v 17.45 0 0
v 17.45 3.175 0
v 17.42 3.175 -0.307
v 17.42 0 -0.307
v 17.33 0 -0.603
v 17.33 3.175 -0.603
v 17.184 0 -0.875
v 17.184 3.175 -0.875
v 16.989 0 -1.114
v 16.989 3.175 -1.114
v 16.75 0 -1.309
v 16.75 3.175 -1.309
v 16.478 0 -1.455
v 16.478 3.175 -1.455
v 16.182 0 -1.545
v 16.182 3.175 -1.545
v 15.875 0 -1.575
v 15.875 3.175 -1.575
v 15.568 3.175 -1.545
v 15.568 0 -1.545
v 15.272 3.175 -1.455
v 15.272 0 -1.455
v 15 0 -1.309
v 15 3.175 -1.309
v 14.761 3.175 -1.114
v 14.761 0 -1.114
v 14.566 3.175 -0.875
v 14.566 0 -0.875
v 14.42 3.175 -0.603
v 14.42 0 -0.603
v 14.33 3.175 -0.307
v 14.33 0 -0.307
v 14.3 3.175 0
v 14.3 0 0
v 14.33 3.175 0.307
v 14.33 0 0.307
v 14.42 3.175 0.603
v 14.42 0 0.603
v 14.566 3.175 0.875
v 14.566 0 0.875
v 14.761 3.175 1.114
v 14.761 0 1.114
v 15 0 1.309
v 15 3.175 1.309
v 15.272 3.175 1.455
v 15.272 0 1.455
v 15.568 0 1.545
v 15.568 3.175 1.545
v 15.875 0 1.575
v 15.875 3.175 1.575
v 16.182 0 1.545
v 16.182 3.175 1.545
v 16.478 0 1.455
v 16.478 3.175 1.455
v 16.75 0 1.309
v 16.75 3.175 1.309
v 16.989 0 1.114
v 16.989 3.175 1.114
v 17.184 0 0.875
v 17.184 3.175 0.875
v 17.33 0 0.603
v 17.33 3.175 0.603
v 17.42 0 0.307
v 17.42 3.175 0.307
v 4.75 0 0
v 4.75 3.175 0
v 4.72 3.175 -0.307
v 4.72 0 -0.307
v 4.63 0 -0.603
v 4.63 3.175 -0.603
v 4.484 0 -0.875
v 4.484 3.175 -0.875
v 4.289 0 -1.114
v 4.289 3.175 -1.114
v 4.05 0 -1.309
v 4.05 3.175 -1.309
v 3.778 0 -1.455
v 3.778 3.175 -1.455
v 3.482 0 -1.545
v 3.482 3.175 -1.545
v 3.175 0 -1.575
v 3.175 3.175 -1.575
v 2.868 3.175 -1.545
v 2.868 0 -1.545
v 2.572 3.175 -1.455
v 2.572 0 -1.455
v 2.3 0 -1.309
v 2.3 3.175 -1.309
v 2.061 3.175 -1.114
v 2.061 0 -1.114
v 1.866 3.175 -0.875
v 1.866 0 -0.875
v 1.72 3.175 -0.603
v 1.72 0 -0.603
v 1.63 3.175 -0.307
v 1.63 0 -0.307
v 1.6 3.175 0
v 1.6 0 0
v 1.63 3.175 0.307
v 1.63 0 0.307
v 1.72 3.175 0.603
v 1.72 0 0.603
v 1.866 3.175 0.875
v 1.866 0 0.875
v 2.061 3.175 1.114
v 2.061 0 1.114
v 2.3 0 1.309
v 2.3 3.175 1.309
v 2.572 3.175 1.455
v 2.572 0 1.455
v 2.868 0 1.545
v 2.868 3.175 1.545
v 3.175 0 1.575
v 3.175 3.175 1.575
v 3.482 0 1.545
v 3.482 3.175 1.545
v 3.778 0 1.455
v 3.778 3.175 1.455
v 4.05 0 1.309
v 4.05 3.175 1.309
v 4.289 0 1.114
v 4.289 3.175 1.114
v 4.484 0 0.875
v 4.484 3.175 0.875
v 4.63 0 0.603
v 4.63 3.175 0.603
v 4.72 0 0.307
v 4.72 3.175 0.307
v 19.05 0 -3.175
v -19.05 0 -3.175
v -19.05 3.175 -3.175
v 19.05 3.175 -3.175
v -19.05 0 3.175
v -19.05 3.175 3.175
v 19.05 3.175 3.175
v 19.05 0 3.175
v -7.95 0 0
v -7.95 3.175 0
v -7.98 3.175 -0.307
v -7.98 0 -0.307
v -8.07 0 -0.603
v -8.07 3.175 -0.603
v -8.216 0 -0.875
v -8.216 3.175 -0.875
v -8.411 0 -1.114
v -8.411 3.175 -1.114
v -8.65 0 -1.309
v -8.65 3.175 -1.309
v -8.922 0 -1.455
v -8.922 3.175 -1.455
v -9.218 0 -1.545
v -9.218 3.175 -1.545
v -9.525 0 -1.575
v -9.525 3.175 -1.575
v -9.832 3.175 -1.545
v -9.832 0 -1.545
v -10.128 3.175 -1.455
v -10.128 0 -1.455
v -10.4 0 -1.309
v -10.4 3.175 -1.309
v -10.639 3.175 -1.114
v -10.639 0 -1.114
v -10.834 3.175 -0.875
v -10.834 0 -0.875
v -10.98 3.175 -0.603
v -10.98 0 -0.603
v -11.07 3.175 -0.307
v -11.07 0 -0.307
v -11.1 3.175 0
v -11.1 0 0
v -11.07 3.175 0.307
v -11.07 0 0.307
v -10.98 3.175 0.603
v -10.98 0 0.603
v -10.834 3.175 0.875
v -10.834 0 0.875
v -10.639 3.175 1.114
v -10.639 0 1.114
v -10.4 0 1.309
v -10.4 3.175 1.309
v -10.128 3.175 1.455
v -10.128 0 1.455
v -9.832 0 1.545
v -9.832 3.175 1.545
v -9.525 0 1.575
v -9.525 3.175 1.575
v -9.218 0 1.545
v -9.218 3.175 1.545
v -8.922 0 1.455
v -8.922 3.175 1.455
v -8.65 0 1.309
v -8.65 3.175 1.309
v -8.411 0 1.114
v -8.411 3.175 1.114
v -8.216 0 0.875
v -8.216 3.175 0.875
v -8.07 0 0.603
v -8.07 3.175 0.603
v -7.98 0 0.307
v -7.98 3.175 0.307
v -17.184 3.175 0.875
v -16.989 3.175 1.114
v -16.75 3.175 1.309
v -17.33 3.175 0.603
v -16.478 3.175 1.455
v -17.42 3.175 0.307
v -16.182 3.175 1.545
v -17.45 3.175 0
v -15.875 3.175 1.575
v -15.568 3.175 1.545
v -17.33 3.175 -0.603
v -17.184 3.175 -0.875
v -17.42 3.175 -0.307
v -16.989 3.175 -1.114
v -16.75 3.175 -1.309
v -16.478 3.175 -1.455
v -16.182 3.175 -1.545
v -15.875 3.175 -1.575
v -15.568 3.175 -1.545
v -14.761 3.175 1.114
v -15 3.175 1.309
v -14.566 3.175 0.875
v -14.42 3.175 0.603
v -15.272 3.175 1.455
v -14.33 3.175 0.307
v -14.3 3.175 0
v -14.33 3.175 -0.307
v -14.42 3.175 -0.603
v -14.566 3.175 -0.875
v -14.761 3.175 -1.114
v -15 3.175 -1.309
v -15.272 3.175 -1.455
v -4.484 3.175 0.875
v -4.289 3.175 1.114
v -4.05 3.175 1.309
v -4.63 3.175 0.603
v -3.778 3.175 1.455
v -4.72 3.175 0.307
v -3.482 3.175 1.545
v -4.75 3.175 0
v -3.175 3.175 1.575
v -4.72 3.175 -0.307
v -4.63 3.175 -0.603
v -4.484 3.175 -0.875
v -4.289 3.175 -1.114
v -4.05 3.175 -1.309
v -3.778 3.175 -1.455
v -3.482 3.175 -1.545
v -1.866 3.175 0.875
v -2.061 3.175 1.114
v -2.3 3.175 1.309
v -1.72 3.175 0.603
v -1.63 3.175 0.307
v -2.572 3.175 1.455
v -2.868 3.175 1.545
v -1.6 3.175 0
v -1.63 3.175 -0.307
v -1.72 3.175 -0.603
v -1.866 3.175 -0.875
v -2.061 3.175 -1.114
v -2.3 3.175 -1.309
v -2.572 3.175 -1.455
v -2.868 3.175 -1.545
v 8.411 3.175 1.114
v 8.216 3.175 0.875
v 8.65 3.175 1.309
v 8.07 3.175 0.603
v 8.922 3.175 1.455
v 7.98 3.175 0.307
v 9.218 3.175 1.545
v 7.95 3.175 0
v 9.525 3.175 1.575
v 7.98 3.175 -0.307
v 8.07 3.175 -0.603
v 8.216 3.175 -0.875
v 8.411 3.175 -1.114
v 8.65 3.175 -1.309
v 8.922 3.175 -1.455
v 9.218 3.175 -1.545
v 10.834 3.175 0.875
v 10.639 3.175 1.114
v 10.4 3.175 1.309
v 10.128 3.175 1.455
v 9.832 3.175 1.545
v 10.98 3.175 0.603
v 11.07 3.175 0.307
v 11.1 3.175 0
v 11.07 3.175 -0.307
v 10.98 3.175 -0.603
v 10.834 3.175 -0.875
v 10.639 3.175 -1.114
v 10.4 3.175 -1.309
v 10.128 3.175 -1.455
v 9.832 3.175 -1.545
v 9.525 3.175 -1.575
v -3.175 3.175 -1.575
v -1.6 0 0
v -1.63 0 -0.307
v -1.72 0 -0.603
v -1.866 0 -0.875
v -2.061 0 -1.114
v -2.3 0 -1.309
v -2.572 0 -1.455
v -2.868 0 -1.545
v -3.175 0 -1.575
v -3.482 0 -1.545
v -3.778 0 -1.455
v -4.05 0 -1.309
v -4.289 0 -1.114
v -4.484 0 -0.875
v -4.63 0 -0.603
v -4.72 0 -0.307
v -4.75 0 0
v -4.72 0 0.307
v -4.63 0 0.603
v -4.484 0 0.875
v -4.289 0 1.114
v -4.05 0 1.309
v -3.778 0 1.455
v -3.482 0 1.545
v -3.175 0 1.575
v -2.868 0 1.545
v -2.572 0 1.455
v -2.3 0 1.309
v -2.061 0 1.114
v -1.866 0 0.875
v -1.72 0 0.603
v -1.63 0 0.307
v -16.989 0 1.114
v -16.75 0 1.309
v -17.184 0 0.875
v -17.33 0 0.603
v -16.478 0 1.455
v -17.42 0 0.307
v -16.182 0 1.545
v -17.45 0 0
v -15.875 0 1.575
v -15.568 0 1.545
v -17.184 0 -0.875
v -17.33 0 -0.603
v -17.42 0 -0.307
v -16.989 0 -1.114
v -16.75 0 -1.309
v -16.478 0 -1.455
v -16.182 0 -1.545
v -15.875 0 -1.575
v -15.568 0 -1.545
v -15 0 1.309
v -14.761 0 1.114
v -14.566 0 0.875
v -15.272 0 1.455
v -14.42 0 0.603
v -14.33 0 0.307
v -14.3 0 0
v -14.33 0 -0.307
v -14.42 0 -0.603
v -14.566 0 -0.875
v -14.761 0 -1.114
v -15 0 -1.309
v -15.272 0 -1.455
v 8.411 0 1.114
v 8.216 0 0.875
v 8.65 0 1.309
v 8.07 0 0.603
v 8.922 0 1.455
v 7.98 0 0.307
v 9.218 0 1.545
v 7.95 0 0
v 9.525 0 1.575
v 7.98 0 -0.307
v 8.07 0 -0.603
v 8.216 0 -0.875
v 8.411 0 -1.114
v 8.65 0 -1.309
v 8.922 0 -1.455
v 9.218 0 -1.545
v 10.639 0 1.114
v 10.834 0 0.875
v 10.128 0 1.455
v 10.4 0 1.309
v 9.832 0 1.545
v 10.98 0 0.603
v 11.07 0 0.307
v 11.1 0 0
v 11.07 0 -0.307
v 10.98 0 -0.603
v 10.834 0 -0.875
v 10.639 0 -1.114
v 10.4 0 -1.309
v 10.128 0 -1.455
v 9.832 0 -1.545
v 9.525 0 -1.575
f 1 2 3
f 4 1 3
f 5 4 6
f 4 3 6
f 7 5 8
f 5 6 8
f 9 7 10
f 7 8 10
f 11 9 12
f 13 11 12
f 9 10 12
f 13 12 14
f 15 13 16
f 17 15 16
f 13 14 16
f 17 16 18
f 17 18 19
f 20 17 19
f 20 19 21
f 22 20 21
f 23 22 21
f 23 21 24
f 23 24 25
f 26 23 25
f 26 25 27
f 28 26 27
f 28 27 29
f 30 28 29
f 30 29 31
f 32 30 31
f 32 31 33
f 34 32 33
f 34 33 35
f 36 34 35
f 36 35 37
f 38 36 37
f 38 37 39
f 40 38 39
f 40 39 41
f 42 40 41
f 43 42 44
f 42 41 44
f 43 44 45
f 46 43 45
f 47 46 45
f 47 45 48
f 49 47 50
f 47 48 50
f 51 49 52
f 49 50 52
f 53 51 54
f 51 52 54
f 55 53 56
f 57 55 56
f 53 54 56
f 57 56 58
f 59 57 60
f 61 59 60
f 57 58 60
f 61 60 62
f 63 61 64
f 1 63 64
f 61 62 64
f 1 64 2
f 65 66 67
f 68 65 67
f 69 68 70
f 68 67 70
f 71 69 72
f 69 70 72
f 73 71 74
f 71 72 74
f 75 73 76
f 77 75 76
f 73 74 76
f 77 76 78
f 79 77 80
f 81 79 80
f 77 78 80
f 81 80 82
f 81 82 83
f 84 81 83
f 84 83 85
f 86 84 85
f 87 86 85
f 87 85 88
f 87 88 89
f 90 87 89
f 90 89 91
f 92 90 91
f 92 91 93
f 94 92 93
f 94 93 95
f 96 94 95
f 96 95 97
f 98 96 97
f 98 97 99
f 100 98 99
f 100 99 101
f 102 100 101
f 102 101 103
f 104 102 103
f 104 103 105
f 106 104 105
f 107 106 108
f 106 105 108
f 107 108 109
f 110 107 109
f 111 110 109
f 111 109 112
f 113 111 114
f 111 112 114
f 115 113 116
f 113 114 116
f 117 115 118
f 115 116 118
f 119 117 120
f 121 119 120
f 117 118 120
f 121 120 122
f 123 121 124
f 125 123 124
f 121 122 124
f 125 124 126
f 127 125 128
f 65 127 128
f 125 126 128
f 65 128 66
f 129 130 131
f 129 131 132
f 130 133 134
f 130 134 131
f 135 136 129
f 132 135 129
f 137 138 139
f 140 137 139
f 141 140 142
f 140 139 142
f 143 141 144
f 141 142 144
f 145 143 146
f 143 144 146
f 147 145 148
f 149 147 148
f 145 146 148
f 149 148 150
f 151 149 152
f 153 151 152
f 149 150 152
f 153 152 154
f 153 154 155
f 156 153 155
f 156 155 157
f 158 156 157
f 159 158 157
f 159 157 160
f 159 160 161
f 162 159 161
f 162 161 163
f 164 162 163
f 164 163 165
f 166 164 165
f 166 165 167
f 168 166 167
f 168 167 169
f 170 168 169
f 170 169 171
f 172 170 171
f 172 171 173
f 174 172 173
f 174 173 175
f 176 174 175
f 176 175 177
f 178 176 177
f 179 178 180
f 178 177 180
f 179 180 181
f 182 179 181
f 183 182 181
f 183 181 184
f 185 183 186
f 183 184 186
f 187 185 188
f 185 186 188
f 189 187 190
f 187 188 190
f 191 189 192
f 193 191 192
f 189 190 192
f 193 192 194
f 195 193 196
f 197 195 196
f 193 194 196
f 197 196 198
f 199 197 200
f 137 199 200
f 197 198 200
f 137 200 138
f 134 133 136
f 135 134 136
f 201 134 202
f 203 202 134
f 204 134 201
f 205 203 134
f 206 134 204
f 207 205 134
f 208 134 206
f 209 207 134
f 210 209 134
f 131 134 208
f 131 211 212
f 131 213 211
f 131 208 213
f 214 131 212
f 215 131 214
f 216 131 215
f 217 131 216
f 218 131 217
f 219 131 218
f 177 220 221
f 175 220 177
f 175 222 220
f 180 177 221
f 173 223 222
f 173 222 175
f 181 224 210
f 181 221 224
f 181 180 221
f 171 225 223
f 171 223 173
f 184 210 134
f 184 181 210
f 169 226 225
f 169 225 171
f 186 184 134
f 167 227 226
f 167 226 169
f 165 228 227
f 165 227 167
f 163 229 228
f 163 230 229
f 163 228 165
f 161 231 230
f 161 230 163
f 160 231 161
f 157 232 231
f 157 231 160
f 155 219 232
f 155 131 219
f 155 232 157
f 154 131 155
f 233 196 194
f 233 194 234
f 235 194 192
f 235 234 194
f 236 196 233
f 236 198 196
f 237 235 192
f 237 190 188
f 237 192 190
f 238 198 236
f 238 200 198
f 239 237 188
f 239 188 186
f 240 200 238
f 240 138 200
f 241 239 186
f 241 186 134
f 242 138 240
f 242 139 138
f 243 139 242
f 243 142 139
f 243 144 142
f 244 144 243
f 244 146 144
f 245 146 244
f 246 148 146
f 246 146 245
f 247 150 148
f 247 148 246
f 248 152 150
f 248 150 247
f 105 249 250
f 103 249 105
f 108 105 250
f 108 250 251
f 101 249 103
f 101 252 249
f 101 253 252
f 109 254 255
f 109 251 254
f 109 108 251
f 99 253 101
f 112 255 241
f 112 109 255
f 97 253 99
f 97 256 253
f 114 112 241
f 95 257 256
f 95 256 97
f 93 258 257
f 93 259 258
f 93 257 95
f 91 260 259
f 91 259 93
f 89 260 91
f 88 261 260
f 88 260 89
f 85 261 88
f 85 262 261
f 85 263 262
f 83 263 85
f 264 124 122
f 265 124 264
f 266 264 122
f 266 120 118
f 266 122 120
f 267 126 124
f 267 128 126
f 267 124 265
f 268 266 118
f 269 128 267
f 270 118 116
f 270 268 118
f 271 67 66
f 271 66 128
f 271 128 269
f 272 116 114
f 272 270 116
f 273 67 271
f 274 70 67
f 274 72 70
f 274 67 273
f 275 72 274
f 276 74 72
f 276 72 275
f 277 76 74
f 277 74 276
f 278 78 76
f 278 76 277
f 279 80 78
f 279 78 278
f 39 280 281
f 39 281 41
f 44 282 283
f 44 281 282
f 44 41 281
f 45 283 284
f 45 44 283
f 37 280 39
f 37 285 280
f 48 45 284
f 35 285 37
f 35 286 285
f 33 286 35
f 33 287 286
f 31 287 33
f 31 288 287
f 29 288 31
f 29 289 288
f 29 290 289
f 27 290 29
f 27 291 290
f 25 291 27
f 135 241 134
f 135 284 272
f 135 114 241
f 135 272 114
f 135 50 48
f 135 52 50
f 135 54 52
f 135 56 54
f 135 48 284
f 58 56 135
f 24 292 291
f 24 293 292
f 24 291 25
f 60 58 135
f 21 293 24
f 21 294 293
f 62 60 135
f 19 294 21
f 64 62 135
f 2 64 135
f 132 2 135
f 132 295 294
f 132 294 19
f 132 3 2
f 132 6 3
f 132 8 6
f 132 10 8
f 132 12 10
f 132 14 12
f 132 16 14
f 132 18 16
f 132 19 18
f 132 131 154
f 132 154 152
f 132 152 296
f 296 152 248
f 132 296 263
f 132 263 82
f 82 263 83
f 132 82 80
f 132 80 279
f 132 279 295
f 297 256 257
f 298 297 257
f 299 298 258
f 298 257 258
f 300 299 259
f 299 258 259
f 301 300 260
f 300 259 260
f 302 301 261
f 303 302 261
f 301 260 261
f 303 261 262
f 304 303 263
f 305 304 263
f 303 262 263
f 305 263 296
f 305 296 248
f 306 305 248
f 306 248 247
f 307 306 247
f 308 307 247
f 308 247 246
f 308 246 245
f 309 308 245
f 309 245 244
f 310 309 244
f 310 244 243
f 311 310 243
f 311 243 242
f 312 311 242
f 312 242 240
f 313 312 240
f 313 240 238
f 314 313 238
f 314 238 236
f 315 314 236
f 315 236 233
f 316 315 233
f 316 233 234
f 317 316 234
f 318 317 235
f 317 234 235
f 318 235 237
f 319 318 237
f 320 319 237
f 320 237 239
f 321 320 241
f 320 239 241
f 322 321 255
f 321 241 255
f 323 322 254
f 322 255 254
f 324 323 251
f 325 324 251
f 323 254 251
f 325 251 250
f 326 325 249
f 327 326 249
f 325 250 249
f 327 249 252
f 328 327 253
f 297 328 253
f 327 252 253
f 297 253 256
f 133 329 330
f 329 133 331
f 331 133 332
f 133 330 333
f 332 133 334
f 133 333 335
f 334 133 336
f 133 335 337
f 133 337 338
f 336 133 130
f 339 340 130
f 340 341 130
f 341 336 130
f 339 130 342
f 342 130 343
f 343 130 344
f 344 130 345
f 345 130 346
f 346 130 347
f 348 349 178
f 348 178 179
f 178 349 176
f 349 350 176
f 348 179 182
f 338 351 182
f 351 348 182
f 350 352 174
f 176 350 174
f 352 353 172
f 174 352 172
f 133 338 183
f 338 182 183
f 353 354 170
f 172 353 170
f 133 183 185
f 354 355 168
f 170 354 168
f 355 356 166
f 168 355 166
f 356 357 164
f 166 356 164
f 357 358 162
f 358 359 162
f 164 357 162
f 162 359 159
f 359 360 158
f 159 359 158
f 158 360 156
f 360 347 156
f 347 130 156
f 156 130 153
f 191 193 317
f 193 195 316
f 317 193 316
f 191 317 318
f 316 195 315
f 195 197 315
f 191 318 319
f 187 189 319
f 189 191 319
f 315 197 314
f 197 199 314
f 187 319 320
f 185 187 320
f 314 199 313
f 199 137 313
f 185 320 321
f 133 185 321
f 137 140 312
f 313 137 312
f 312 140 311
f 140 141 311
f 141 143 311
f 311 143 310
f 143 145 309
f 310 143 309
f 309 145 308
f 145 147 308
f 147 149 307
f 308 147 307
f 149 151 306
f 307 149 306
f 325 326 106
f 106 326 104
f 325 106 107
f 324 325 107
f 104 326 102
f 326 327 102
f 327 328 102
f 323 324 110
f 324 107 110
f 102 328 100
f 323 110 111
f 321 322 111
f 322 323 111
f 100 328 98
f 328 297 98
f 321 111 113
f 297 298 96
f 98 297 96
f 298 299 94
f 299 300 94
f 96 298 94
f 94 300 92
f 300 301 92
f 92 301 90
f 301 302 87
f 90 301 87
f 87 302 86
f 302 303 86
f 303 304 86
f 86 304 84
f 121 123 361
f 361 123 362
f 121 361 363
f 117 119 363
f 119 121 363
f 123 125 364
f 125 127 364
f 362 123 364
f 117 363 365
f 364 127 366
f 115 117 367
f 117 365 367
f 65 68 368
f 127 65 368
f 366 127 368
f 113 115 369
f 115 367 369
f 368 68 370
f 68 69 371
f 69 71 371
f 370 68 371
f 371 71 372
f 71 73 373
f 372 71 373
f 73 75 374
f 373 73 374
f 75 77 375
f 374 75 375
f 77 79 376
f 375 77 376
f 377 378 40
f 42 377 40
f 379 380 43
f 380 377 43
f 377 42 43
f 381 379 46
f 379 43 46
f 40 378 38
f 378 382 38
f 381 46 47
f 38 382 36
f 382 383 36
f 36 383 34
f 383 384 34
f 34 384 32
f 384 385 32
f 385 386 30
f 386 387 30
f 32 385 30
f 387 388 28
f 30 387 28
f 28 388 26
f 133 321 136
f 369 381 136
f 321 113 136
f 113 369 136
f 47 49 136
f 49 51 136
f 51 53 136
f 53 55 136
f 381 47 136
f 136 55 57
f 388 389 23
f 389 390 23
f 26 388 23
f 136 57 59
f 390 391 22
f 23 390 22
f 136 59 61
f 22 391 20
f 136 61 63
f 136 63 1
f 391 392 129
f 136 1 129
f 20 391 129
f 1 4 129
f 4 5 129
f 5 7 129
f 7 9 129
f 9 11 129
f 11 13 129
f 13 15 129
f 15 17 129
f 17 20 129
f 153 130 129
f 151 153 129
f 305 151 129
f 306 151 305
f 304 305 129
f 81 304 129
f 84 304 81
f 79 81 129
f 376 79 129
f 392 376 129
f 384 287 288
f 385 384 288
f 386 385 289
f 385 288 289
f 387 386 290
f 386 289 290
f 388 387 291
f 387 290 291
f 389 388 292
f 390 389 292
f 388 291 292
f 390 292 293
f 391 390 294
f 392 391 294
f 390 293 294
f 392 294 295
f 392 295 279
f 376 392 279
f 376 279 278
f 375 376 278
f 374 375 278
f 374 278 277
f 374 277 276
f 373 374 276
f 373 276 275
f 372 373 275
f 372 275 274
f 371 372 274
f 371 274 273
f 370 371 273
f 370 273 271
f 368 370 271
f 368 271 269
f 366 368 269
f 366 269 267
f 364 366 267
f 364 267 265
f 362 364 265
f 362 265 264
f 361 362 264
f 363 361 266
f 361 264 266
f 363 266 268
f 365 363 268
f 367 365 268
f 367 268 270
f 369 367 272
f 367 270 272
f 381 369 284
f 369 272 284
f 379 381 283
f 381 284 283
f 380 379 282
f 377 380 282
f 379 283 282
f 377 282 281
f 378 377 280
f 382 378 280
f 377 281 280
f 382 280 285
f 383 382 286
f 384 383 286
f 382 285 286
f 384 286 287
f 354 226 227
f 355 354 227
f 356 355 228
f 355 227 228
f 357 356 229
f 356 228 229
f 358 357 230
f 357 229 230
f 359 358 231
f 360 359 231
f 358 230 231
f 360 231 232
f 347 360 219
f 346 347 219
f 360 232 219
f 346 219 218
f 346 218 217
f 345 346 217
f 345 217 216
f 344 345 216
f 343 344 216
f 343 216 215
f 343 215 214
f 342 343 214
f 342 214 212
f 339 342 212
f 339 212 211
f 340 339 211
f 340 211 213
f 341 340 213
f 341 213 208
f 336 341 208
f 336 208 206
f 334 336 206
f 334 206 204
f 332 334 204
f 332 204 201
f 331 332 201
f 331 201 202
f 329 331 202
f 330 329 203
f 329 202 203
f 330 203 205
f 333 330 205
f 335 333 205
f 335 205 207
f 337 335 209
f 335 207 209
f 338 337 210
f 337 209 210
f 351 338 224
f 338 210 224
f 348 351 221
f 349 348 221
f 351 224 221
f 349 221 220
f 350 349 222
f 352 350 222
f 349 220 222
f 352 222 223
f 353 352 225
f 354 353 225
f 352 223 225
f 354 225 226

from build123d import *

# Parameters (mm, degrees)
SKETCH1_W           = 38.1
SKETCH1_H           = 6.35
BOSS_EXTRUDE1_DEPTH = 3.175
SKETCH2_R           = 1.5748
CUT_EXTRUDE1_DEPTH  = 4.175
LPATTERN1_COUNT     = 6
LPATTERN1_PITCH     = 6.35


with BuildPart() as part:
    # Sketch1 → Boss-Extrude1 (new body)
    with BuildSketch(Plane(origin=(0, 0, 0), x_dir=(1, 0, 0), z_dir=(0, 1, 0))):
        Rectangle(SKETCH1_W, SKETCH1_H)
    extrude(amount=BOSS_EXTRUDE1_DEPTH)

    # Sketch2 → Cut-Extrude1 (cut, through all)
    with BuildSketch(Plane(origin=(0, 3.175, 0), x_dir=(1, 0, 0), z_dir=(0, 1, 0))):
        with Locations((15.875, 0)):
            Circle(SKETCH2_R)
    cut_extrude1 = extrude(amount=-CUT_EXTRUDE1_DEPTH, mode=Mode.SUBTRACT)

    # LPattern1: Cut-Extrude1 ×6
    with Locations(*[(-i * LPATTERN1_PITCH, 0, 0) for i in range(1, LPATTERN1_COUNT)]):
        add(cut_extrude1, mode=Mode.SUBTRACT)


solid = part.part
